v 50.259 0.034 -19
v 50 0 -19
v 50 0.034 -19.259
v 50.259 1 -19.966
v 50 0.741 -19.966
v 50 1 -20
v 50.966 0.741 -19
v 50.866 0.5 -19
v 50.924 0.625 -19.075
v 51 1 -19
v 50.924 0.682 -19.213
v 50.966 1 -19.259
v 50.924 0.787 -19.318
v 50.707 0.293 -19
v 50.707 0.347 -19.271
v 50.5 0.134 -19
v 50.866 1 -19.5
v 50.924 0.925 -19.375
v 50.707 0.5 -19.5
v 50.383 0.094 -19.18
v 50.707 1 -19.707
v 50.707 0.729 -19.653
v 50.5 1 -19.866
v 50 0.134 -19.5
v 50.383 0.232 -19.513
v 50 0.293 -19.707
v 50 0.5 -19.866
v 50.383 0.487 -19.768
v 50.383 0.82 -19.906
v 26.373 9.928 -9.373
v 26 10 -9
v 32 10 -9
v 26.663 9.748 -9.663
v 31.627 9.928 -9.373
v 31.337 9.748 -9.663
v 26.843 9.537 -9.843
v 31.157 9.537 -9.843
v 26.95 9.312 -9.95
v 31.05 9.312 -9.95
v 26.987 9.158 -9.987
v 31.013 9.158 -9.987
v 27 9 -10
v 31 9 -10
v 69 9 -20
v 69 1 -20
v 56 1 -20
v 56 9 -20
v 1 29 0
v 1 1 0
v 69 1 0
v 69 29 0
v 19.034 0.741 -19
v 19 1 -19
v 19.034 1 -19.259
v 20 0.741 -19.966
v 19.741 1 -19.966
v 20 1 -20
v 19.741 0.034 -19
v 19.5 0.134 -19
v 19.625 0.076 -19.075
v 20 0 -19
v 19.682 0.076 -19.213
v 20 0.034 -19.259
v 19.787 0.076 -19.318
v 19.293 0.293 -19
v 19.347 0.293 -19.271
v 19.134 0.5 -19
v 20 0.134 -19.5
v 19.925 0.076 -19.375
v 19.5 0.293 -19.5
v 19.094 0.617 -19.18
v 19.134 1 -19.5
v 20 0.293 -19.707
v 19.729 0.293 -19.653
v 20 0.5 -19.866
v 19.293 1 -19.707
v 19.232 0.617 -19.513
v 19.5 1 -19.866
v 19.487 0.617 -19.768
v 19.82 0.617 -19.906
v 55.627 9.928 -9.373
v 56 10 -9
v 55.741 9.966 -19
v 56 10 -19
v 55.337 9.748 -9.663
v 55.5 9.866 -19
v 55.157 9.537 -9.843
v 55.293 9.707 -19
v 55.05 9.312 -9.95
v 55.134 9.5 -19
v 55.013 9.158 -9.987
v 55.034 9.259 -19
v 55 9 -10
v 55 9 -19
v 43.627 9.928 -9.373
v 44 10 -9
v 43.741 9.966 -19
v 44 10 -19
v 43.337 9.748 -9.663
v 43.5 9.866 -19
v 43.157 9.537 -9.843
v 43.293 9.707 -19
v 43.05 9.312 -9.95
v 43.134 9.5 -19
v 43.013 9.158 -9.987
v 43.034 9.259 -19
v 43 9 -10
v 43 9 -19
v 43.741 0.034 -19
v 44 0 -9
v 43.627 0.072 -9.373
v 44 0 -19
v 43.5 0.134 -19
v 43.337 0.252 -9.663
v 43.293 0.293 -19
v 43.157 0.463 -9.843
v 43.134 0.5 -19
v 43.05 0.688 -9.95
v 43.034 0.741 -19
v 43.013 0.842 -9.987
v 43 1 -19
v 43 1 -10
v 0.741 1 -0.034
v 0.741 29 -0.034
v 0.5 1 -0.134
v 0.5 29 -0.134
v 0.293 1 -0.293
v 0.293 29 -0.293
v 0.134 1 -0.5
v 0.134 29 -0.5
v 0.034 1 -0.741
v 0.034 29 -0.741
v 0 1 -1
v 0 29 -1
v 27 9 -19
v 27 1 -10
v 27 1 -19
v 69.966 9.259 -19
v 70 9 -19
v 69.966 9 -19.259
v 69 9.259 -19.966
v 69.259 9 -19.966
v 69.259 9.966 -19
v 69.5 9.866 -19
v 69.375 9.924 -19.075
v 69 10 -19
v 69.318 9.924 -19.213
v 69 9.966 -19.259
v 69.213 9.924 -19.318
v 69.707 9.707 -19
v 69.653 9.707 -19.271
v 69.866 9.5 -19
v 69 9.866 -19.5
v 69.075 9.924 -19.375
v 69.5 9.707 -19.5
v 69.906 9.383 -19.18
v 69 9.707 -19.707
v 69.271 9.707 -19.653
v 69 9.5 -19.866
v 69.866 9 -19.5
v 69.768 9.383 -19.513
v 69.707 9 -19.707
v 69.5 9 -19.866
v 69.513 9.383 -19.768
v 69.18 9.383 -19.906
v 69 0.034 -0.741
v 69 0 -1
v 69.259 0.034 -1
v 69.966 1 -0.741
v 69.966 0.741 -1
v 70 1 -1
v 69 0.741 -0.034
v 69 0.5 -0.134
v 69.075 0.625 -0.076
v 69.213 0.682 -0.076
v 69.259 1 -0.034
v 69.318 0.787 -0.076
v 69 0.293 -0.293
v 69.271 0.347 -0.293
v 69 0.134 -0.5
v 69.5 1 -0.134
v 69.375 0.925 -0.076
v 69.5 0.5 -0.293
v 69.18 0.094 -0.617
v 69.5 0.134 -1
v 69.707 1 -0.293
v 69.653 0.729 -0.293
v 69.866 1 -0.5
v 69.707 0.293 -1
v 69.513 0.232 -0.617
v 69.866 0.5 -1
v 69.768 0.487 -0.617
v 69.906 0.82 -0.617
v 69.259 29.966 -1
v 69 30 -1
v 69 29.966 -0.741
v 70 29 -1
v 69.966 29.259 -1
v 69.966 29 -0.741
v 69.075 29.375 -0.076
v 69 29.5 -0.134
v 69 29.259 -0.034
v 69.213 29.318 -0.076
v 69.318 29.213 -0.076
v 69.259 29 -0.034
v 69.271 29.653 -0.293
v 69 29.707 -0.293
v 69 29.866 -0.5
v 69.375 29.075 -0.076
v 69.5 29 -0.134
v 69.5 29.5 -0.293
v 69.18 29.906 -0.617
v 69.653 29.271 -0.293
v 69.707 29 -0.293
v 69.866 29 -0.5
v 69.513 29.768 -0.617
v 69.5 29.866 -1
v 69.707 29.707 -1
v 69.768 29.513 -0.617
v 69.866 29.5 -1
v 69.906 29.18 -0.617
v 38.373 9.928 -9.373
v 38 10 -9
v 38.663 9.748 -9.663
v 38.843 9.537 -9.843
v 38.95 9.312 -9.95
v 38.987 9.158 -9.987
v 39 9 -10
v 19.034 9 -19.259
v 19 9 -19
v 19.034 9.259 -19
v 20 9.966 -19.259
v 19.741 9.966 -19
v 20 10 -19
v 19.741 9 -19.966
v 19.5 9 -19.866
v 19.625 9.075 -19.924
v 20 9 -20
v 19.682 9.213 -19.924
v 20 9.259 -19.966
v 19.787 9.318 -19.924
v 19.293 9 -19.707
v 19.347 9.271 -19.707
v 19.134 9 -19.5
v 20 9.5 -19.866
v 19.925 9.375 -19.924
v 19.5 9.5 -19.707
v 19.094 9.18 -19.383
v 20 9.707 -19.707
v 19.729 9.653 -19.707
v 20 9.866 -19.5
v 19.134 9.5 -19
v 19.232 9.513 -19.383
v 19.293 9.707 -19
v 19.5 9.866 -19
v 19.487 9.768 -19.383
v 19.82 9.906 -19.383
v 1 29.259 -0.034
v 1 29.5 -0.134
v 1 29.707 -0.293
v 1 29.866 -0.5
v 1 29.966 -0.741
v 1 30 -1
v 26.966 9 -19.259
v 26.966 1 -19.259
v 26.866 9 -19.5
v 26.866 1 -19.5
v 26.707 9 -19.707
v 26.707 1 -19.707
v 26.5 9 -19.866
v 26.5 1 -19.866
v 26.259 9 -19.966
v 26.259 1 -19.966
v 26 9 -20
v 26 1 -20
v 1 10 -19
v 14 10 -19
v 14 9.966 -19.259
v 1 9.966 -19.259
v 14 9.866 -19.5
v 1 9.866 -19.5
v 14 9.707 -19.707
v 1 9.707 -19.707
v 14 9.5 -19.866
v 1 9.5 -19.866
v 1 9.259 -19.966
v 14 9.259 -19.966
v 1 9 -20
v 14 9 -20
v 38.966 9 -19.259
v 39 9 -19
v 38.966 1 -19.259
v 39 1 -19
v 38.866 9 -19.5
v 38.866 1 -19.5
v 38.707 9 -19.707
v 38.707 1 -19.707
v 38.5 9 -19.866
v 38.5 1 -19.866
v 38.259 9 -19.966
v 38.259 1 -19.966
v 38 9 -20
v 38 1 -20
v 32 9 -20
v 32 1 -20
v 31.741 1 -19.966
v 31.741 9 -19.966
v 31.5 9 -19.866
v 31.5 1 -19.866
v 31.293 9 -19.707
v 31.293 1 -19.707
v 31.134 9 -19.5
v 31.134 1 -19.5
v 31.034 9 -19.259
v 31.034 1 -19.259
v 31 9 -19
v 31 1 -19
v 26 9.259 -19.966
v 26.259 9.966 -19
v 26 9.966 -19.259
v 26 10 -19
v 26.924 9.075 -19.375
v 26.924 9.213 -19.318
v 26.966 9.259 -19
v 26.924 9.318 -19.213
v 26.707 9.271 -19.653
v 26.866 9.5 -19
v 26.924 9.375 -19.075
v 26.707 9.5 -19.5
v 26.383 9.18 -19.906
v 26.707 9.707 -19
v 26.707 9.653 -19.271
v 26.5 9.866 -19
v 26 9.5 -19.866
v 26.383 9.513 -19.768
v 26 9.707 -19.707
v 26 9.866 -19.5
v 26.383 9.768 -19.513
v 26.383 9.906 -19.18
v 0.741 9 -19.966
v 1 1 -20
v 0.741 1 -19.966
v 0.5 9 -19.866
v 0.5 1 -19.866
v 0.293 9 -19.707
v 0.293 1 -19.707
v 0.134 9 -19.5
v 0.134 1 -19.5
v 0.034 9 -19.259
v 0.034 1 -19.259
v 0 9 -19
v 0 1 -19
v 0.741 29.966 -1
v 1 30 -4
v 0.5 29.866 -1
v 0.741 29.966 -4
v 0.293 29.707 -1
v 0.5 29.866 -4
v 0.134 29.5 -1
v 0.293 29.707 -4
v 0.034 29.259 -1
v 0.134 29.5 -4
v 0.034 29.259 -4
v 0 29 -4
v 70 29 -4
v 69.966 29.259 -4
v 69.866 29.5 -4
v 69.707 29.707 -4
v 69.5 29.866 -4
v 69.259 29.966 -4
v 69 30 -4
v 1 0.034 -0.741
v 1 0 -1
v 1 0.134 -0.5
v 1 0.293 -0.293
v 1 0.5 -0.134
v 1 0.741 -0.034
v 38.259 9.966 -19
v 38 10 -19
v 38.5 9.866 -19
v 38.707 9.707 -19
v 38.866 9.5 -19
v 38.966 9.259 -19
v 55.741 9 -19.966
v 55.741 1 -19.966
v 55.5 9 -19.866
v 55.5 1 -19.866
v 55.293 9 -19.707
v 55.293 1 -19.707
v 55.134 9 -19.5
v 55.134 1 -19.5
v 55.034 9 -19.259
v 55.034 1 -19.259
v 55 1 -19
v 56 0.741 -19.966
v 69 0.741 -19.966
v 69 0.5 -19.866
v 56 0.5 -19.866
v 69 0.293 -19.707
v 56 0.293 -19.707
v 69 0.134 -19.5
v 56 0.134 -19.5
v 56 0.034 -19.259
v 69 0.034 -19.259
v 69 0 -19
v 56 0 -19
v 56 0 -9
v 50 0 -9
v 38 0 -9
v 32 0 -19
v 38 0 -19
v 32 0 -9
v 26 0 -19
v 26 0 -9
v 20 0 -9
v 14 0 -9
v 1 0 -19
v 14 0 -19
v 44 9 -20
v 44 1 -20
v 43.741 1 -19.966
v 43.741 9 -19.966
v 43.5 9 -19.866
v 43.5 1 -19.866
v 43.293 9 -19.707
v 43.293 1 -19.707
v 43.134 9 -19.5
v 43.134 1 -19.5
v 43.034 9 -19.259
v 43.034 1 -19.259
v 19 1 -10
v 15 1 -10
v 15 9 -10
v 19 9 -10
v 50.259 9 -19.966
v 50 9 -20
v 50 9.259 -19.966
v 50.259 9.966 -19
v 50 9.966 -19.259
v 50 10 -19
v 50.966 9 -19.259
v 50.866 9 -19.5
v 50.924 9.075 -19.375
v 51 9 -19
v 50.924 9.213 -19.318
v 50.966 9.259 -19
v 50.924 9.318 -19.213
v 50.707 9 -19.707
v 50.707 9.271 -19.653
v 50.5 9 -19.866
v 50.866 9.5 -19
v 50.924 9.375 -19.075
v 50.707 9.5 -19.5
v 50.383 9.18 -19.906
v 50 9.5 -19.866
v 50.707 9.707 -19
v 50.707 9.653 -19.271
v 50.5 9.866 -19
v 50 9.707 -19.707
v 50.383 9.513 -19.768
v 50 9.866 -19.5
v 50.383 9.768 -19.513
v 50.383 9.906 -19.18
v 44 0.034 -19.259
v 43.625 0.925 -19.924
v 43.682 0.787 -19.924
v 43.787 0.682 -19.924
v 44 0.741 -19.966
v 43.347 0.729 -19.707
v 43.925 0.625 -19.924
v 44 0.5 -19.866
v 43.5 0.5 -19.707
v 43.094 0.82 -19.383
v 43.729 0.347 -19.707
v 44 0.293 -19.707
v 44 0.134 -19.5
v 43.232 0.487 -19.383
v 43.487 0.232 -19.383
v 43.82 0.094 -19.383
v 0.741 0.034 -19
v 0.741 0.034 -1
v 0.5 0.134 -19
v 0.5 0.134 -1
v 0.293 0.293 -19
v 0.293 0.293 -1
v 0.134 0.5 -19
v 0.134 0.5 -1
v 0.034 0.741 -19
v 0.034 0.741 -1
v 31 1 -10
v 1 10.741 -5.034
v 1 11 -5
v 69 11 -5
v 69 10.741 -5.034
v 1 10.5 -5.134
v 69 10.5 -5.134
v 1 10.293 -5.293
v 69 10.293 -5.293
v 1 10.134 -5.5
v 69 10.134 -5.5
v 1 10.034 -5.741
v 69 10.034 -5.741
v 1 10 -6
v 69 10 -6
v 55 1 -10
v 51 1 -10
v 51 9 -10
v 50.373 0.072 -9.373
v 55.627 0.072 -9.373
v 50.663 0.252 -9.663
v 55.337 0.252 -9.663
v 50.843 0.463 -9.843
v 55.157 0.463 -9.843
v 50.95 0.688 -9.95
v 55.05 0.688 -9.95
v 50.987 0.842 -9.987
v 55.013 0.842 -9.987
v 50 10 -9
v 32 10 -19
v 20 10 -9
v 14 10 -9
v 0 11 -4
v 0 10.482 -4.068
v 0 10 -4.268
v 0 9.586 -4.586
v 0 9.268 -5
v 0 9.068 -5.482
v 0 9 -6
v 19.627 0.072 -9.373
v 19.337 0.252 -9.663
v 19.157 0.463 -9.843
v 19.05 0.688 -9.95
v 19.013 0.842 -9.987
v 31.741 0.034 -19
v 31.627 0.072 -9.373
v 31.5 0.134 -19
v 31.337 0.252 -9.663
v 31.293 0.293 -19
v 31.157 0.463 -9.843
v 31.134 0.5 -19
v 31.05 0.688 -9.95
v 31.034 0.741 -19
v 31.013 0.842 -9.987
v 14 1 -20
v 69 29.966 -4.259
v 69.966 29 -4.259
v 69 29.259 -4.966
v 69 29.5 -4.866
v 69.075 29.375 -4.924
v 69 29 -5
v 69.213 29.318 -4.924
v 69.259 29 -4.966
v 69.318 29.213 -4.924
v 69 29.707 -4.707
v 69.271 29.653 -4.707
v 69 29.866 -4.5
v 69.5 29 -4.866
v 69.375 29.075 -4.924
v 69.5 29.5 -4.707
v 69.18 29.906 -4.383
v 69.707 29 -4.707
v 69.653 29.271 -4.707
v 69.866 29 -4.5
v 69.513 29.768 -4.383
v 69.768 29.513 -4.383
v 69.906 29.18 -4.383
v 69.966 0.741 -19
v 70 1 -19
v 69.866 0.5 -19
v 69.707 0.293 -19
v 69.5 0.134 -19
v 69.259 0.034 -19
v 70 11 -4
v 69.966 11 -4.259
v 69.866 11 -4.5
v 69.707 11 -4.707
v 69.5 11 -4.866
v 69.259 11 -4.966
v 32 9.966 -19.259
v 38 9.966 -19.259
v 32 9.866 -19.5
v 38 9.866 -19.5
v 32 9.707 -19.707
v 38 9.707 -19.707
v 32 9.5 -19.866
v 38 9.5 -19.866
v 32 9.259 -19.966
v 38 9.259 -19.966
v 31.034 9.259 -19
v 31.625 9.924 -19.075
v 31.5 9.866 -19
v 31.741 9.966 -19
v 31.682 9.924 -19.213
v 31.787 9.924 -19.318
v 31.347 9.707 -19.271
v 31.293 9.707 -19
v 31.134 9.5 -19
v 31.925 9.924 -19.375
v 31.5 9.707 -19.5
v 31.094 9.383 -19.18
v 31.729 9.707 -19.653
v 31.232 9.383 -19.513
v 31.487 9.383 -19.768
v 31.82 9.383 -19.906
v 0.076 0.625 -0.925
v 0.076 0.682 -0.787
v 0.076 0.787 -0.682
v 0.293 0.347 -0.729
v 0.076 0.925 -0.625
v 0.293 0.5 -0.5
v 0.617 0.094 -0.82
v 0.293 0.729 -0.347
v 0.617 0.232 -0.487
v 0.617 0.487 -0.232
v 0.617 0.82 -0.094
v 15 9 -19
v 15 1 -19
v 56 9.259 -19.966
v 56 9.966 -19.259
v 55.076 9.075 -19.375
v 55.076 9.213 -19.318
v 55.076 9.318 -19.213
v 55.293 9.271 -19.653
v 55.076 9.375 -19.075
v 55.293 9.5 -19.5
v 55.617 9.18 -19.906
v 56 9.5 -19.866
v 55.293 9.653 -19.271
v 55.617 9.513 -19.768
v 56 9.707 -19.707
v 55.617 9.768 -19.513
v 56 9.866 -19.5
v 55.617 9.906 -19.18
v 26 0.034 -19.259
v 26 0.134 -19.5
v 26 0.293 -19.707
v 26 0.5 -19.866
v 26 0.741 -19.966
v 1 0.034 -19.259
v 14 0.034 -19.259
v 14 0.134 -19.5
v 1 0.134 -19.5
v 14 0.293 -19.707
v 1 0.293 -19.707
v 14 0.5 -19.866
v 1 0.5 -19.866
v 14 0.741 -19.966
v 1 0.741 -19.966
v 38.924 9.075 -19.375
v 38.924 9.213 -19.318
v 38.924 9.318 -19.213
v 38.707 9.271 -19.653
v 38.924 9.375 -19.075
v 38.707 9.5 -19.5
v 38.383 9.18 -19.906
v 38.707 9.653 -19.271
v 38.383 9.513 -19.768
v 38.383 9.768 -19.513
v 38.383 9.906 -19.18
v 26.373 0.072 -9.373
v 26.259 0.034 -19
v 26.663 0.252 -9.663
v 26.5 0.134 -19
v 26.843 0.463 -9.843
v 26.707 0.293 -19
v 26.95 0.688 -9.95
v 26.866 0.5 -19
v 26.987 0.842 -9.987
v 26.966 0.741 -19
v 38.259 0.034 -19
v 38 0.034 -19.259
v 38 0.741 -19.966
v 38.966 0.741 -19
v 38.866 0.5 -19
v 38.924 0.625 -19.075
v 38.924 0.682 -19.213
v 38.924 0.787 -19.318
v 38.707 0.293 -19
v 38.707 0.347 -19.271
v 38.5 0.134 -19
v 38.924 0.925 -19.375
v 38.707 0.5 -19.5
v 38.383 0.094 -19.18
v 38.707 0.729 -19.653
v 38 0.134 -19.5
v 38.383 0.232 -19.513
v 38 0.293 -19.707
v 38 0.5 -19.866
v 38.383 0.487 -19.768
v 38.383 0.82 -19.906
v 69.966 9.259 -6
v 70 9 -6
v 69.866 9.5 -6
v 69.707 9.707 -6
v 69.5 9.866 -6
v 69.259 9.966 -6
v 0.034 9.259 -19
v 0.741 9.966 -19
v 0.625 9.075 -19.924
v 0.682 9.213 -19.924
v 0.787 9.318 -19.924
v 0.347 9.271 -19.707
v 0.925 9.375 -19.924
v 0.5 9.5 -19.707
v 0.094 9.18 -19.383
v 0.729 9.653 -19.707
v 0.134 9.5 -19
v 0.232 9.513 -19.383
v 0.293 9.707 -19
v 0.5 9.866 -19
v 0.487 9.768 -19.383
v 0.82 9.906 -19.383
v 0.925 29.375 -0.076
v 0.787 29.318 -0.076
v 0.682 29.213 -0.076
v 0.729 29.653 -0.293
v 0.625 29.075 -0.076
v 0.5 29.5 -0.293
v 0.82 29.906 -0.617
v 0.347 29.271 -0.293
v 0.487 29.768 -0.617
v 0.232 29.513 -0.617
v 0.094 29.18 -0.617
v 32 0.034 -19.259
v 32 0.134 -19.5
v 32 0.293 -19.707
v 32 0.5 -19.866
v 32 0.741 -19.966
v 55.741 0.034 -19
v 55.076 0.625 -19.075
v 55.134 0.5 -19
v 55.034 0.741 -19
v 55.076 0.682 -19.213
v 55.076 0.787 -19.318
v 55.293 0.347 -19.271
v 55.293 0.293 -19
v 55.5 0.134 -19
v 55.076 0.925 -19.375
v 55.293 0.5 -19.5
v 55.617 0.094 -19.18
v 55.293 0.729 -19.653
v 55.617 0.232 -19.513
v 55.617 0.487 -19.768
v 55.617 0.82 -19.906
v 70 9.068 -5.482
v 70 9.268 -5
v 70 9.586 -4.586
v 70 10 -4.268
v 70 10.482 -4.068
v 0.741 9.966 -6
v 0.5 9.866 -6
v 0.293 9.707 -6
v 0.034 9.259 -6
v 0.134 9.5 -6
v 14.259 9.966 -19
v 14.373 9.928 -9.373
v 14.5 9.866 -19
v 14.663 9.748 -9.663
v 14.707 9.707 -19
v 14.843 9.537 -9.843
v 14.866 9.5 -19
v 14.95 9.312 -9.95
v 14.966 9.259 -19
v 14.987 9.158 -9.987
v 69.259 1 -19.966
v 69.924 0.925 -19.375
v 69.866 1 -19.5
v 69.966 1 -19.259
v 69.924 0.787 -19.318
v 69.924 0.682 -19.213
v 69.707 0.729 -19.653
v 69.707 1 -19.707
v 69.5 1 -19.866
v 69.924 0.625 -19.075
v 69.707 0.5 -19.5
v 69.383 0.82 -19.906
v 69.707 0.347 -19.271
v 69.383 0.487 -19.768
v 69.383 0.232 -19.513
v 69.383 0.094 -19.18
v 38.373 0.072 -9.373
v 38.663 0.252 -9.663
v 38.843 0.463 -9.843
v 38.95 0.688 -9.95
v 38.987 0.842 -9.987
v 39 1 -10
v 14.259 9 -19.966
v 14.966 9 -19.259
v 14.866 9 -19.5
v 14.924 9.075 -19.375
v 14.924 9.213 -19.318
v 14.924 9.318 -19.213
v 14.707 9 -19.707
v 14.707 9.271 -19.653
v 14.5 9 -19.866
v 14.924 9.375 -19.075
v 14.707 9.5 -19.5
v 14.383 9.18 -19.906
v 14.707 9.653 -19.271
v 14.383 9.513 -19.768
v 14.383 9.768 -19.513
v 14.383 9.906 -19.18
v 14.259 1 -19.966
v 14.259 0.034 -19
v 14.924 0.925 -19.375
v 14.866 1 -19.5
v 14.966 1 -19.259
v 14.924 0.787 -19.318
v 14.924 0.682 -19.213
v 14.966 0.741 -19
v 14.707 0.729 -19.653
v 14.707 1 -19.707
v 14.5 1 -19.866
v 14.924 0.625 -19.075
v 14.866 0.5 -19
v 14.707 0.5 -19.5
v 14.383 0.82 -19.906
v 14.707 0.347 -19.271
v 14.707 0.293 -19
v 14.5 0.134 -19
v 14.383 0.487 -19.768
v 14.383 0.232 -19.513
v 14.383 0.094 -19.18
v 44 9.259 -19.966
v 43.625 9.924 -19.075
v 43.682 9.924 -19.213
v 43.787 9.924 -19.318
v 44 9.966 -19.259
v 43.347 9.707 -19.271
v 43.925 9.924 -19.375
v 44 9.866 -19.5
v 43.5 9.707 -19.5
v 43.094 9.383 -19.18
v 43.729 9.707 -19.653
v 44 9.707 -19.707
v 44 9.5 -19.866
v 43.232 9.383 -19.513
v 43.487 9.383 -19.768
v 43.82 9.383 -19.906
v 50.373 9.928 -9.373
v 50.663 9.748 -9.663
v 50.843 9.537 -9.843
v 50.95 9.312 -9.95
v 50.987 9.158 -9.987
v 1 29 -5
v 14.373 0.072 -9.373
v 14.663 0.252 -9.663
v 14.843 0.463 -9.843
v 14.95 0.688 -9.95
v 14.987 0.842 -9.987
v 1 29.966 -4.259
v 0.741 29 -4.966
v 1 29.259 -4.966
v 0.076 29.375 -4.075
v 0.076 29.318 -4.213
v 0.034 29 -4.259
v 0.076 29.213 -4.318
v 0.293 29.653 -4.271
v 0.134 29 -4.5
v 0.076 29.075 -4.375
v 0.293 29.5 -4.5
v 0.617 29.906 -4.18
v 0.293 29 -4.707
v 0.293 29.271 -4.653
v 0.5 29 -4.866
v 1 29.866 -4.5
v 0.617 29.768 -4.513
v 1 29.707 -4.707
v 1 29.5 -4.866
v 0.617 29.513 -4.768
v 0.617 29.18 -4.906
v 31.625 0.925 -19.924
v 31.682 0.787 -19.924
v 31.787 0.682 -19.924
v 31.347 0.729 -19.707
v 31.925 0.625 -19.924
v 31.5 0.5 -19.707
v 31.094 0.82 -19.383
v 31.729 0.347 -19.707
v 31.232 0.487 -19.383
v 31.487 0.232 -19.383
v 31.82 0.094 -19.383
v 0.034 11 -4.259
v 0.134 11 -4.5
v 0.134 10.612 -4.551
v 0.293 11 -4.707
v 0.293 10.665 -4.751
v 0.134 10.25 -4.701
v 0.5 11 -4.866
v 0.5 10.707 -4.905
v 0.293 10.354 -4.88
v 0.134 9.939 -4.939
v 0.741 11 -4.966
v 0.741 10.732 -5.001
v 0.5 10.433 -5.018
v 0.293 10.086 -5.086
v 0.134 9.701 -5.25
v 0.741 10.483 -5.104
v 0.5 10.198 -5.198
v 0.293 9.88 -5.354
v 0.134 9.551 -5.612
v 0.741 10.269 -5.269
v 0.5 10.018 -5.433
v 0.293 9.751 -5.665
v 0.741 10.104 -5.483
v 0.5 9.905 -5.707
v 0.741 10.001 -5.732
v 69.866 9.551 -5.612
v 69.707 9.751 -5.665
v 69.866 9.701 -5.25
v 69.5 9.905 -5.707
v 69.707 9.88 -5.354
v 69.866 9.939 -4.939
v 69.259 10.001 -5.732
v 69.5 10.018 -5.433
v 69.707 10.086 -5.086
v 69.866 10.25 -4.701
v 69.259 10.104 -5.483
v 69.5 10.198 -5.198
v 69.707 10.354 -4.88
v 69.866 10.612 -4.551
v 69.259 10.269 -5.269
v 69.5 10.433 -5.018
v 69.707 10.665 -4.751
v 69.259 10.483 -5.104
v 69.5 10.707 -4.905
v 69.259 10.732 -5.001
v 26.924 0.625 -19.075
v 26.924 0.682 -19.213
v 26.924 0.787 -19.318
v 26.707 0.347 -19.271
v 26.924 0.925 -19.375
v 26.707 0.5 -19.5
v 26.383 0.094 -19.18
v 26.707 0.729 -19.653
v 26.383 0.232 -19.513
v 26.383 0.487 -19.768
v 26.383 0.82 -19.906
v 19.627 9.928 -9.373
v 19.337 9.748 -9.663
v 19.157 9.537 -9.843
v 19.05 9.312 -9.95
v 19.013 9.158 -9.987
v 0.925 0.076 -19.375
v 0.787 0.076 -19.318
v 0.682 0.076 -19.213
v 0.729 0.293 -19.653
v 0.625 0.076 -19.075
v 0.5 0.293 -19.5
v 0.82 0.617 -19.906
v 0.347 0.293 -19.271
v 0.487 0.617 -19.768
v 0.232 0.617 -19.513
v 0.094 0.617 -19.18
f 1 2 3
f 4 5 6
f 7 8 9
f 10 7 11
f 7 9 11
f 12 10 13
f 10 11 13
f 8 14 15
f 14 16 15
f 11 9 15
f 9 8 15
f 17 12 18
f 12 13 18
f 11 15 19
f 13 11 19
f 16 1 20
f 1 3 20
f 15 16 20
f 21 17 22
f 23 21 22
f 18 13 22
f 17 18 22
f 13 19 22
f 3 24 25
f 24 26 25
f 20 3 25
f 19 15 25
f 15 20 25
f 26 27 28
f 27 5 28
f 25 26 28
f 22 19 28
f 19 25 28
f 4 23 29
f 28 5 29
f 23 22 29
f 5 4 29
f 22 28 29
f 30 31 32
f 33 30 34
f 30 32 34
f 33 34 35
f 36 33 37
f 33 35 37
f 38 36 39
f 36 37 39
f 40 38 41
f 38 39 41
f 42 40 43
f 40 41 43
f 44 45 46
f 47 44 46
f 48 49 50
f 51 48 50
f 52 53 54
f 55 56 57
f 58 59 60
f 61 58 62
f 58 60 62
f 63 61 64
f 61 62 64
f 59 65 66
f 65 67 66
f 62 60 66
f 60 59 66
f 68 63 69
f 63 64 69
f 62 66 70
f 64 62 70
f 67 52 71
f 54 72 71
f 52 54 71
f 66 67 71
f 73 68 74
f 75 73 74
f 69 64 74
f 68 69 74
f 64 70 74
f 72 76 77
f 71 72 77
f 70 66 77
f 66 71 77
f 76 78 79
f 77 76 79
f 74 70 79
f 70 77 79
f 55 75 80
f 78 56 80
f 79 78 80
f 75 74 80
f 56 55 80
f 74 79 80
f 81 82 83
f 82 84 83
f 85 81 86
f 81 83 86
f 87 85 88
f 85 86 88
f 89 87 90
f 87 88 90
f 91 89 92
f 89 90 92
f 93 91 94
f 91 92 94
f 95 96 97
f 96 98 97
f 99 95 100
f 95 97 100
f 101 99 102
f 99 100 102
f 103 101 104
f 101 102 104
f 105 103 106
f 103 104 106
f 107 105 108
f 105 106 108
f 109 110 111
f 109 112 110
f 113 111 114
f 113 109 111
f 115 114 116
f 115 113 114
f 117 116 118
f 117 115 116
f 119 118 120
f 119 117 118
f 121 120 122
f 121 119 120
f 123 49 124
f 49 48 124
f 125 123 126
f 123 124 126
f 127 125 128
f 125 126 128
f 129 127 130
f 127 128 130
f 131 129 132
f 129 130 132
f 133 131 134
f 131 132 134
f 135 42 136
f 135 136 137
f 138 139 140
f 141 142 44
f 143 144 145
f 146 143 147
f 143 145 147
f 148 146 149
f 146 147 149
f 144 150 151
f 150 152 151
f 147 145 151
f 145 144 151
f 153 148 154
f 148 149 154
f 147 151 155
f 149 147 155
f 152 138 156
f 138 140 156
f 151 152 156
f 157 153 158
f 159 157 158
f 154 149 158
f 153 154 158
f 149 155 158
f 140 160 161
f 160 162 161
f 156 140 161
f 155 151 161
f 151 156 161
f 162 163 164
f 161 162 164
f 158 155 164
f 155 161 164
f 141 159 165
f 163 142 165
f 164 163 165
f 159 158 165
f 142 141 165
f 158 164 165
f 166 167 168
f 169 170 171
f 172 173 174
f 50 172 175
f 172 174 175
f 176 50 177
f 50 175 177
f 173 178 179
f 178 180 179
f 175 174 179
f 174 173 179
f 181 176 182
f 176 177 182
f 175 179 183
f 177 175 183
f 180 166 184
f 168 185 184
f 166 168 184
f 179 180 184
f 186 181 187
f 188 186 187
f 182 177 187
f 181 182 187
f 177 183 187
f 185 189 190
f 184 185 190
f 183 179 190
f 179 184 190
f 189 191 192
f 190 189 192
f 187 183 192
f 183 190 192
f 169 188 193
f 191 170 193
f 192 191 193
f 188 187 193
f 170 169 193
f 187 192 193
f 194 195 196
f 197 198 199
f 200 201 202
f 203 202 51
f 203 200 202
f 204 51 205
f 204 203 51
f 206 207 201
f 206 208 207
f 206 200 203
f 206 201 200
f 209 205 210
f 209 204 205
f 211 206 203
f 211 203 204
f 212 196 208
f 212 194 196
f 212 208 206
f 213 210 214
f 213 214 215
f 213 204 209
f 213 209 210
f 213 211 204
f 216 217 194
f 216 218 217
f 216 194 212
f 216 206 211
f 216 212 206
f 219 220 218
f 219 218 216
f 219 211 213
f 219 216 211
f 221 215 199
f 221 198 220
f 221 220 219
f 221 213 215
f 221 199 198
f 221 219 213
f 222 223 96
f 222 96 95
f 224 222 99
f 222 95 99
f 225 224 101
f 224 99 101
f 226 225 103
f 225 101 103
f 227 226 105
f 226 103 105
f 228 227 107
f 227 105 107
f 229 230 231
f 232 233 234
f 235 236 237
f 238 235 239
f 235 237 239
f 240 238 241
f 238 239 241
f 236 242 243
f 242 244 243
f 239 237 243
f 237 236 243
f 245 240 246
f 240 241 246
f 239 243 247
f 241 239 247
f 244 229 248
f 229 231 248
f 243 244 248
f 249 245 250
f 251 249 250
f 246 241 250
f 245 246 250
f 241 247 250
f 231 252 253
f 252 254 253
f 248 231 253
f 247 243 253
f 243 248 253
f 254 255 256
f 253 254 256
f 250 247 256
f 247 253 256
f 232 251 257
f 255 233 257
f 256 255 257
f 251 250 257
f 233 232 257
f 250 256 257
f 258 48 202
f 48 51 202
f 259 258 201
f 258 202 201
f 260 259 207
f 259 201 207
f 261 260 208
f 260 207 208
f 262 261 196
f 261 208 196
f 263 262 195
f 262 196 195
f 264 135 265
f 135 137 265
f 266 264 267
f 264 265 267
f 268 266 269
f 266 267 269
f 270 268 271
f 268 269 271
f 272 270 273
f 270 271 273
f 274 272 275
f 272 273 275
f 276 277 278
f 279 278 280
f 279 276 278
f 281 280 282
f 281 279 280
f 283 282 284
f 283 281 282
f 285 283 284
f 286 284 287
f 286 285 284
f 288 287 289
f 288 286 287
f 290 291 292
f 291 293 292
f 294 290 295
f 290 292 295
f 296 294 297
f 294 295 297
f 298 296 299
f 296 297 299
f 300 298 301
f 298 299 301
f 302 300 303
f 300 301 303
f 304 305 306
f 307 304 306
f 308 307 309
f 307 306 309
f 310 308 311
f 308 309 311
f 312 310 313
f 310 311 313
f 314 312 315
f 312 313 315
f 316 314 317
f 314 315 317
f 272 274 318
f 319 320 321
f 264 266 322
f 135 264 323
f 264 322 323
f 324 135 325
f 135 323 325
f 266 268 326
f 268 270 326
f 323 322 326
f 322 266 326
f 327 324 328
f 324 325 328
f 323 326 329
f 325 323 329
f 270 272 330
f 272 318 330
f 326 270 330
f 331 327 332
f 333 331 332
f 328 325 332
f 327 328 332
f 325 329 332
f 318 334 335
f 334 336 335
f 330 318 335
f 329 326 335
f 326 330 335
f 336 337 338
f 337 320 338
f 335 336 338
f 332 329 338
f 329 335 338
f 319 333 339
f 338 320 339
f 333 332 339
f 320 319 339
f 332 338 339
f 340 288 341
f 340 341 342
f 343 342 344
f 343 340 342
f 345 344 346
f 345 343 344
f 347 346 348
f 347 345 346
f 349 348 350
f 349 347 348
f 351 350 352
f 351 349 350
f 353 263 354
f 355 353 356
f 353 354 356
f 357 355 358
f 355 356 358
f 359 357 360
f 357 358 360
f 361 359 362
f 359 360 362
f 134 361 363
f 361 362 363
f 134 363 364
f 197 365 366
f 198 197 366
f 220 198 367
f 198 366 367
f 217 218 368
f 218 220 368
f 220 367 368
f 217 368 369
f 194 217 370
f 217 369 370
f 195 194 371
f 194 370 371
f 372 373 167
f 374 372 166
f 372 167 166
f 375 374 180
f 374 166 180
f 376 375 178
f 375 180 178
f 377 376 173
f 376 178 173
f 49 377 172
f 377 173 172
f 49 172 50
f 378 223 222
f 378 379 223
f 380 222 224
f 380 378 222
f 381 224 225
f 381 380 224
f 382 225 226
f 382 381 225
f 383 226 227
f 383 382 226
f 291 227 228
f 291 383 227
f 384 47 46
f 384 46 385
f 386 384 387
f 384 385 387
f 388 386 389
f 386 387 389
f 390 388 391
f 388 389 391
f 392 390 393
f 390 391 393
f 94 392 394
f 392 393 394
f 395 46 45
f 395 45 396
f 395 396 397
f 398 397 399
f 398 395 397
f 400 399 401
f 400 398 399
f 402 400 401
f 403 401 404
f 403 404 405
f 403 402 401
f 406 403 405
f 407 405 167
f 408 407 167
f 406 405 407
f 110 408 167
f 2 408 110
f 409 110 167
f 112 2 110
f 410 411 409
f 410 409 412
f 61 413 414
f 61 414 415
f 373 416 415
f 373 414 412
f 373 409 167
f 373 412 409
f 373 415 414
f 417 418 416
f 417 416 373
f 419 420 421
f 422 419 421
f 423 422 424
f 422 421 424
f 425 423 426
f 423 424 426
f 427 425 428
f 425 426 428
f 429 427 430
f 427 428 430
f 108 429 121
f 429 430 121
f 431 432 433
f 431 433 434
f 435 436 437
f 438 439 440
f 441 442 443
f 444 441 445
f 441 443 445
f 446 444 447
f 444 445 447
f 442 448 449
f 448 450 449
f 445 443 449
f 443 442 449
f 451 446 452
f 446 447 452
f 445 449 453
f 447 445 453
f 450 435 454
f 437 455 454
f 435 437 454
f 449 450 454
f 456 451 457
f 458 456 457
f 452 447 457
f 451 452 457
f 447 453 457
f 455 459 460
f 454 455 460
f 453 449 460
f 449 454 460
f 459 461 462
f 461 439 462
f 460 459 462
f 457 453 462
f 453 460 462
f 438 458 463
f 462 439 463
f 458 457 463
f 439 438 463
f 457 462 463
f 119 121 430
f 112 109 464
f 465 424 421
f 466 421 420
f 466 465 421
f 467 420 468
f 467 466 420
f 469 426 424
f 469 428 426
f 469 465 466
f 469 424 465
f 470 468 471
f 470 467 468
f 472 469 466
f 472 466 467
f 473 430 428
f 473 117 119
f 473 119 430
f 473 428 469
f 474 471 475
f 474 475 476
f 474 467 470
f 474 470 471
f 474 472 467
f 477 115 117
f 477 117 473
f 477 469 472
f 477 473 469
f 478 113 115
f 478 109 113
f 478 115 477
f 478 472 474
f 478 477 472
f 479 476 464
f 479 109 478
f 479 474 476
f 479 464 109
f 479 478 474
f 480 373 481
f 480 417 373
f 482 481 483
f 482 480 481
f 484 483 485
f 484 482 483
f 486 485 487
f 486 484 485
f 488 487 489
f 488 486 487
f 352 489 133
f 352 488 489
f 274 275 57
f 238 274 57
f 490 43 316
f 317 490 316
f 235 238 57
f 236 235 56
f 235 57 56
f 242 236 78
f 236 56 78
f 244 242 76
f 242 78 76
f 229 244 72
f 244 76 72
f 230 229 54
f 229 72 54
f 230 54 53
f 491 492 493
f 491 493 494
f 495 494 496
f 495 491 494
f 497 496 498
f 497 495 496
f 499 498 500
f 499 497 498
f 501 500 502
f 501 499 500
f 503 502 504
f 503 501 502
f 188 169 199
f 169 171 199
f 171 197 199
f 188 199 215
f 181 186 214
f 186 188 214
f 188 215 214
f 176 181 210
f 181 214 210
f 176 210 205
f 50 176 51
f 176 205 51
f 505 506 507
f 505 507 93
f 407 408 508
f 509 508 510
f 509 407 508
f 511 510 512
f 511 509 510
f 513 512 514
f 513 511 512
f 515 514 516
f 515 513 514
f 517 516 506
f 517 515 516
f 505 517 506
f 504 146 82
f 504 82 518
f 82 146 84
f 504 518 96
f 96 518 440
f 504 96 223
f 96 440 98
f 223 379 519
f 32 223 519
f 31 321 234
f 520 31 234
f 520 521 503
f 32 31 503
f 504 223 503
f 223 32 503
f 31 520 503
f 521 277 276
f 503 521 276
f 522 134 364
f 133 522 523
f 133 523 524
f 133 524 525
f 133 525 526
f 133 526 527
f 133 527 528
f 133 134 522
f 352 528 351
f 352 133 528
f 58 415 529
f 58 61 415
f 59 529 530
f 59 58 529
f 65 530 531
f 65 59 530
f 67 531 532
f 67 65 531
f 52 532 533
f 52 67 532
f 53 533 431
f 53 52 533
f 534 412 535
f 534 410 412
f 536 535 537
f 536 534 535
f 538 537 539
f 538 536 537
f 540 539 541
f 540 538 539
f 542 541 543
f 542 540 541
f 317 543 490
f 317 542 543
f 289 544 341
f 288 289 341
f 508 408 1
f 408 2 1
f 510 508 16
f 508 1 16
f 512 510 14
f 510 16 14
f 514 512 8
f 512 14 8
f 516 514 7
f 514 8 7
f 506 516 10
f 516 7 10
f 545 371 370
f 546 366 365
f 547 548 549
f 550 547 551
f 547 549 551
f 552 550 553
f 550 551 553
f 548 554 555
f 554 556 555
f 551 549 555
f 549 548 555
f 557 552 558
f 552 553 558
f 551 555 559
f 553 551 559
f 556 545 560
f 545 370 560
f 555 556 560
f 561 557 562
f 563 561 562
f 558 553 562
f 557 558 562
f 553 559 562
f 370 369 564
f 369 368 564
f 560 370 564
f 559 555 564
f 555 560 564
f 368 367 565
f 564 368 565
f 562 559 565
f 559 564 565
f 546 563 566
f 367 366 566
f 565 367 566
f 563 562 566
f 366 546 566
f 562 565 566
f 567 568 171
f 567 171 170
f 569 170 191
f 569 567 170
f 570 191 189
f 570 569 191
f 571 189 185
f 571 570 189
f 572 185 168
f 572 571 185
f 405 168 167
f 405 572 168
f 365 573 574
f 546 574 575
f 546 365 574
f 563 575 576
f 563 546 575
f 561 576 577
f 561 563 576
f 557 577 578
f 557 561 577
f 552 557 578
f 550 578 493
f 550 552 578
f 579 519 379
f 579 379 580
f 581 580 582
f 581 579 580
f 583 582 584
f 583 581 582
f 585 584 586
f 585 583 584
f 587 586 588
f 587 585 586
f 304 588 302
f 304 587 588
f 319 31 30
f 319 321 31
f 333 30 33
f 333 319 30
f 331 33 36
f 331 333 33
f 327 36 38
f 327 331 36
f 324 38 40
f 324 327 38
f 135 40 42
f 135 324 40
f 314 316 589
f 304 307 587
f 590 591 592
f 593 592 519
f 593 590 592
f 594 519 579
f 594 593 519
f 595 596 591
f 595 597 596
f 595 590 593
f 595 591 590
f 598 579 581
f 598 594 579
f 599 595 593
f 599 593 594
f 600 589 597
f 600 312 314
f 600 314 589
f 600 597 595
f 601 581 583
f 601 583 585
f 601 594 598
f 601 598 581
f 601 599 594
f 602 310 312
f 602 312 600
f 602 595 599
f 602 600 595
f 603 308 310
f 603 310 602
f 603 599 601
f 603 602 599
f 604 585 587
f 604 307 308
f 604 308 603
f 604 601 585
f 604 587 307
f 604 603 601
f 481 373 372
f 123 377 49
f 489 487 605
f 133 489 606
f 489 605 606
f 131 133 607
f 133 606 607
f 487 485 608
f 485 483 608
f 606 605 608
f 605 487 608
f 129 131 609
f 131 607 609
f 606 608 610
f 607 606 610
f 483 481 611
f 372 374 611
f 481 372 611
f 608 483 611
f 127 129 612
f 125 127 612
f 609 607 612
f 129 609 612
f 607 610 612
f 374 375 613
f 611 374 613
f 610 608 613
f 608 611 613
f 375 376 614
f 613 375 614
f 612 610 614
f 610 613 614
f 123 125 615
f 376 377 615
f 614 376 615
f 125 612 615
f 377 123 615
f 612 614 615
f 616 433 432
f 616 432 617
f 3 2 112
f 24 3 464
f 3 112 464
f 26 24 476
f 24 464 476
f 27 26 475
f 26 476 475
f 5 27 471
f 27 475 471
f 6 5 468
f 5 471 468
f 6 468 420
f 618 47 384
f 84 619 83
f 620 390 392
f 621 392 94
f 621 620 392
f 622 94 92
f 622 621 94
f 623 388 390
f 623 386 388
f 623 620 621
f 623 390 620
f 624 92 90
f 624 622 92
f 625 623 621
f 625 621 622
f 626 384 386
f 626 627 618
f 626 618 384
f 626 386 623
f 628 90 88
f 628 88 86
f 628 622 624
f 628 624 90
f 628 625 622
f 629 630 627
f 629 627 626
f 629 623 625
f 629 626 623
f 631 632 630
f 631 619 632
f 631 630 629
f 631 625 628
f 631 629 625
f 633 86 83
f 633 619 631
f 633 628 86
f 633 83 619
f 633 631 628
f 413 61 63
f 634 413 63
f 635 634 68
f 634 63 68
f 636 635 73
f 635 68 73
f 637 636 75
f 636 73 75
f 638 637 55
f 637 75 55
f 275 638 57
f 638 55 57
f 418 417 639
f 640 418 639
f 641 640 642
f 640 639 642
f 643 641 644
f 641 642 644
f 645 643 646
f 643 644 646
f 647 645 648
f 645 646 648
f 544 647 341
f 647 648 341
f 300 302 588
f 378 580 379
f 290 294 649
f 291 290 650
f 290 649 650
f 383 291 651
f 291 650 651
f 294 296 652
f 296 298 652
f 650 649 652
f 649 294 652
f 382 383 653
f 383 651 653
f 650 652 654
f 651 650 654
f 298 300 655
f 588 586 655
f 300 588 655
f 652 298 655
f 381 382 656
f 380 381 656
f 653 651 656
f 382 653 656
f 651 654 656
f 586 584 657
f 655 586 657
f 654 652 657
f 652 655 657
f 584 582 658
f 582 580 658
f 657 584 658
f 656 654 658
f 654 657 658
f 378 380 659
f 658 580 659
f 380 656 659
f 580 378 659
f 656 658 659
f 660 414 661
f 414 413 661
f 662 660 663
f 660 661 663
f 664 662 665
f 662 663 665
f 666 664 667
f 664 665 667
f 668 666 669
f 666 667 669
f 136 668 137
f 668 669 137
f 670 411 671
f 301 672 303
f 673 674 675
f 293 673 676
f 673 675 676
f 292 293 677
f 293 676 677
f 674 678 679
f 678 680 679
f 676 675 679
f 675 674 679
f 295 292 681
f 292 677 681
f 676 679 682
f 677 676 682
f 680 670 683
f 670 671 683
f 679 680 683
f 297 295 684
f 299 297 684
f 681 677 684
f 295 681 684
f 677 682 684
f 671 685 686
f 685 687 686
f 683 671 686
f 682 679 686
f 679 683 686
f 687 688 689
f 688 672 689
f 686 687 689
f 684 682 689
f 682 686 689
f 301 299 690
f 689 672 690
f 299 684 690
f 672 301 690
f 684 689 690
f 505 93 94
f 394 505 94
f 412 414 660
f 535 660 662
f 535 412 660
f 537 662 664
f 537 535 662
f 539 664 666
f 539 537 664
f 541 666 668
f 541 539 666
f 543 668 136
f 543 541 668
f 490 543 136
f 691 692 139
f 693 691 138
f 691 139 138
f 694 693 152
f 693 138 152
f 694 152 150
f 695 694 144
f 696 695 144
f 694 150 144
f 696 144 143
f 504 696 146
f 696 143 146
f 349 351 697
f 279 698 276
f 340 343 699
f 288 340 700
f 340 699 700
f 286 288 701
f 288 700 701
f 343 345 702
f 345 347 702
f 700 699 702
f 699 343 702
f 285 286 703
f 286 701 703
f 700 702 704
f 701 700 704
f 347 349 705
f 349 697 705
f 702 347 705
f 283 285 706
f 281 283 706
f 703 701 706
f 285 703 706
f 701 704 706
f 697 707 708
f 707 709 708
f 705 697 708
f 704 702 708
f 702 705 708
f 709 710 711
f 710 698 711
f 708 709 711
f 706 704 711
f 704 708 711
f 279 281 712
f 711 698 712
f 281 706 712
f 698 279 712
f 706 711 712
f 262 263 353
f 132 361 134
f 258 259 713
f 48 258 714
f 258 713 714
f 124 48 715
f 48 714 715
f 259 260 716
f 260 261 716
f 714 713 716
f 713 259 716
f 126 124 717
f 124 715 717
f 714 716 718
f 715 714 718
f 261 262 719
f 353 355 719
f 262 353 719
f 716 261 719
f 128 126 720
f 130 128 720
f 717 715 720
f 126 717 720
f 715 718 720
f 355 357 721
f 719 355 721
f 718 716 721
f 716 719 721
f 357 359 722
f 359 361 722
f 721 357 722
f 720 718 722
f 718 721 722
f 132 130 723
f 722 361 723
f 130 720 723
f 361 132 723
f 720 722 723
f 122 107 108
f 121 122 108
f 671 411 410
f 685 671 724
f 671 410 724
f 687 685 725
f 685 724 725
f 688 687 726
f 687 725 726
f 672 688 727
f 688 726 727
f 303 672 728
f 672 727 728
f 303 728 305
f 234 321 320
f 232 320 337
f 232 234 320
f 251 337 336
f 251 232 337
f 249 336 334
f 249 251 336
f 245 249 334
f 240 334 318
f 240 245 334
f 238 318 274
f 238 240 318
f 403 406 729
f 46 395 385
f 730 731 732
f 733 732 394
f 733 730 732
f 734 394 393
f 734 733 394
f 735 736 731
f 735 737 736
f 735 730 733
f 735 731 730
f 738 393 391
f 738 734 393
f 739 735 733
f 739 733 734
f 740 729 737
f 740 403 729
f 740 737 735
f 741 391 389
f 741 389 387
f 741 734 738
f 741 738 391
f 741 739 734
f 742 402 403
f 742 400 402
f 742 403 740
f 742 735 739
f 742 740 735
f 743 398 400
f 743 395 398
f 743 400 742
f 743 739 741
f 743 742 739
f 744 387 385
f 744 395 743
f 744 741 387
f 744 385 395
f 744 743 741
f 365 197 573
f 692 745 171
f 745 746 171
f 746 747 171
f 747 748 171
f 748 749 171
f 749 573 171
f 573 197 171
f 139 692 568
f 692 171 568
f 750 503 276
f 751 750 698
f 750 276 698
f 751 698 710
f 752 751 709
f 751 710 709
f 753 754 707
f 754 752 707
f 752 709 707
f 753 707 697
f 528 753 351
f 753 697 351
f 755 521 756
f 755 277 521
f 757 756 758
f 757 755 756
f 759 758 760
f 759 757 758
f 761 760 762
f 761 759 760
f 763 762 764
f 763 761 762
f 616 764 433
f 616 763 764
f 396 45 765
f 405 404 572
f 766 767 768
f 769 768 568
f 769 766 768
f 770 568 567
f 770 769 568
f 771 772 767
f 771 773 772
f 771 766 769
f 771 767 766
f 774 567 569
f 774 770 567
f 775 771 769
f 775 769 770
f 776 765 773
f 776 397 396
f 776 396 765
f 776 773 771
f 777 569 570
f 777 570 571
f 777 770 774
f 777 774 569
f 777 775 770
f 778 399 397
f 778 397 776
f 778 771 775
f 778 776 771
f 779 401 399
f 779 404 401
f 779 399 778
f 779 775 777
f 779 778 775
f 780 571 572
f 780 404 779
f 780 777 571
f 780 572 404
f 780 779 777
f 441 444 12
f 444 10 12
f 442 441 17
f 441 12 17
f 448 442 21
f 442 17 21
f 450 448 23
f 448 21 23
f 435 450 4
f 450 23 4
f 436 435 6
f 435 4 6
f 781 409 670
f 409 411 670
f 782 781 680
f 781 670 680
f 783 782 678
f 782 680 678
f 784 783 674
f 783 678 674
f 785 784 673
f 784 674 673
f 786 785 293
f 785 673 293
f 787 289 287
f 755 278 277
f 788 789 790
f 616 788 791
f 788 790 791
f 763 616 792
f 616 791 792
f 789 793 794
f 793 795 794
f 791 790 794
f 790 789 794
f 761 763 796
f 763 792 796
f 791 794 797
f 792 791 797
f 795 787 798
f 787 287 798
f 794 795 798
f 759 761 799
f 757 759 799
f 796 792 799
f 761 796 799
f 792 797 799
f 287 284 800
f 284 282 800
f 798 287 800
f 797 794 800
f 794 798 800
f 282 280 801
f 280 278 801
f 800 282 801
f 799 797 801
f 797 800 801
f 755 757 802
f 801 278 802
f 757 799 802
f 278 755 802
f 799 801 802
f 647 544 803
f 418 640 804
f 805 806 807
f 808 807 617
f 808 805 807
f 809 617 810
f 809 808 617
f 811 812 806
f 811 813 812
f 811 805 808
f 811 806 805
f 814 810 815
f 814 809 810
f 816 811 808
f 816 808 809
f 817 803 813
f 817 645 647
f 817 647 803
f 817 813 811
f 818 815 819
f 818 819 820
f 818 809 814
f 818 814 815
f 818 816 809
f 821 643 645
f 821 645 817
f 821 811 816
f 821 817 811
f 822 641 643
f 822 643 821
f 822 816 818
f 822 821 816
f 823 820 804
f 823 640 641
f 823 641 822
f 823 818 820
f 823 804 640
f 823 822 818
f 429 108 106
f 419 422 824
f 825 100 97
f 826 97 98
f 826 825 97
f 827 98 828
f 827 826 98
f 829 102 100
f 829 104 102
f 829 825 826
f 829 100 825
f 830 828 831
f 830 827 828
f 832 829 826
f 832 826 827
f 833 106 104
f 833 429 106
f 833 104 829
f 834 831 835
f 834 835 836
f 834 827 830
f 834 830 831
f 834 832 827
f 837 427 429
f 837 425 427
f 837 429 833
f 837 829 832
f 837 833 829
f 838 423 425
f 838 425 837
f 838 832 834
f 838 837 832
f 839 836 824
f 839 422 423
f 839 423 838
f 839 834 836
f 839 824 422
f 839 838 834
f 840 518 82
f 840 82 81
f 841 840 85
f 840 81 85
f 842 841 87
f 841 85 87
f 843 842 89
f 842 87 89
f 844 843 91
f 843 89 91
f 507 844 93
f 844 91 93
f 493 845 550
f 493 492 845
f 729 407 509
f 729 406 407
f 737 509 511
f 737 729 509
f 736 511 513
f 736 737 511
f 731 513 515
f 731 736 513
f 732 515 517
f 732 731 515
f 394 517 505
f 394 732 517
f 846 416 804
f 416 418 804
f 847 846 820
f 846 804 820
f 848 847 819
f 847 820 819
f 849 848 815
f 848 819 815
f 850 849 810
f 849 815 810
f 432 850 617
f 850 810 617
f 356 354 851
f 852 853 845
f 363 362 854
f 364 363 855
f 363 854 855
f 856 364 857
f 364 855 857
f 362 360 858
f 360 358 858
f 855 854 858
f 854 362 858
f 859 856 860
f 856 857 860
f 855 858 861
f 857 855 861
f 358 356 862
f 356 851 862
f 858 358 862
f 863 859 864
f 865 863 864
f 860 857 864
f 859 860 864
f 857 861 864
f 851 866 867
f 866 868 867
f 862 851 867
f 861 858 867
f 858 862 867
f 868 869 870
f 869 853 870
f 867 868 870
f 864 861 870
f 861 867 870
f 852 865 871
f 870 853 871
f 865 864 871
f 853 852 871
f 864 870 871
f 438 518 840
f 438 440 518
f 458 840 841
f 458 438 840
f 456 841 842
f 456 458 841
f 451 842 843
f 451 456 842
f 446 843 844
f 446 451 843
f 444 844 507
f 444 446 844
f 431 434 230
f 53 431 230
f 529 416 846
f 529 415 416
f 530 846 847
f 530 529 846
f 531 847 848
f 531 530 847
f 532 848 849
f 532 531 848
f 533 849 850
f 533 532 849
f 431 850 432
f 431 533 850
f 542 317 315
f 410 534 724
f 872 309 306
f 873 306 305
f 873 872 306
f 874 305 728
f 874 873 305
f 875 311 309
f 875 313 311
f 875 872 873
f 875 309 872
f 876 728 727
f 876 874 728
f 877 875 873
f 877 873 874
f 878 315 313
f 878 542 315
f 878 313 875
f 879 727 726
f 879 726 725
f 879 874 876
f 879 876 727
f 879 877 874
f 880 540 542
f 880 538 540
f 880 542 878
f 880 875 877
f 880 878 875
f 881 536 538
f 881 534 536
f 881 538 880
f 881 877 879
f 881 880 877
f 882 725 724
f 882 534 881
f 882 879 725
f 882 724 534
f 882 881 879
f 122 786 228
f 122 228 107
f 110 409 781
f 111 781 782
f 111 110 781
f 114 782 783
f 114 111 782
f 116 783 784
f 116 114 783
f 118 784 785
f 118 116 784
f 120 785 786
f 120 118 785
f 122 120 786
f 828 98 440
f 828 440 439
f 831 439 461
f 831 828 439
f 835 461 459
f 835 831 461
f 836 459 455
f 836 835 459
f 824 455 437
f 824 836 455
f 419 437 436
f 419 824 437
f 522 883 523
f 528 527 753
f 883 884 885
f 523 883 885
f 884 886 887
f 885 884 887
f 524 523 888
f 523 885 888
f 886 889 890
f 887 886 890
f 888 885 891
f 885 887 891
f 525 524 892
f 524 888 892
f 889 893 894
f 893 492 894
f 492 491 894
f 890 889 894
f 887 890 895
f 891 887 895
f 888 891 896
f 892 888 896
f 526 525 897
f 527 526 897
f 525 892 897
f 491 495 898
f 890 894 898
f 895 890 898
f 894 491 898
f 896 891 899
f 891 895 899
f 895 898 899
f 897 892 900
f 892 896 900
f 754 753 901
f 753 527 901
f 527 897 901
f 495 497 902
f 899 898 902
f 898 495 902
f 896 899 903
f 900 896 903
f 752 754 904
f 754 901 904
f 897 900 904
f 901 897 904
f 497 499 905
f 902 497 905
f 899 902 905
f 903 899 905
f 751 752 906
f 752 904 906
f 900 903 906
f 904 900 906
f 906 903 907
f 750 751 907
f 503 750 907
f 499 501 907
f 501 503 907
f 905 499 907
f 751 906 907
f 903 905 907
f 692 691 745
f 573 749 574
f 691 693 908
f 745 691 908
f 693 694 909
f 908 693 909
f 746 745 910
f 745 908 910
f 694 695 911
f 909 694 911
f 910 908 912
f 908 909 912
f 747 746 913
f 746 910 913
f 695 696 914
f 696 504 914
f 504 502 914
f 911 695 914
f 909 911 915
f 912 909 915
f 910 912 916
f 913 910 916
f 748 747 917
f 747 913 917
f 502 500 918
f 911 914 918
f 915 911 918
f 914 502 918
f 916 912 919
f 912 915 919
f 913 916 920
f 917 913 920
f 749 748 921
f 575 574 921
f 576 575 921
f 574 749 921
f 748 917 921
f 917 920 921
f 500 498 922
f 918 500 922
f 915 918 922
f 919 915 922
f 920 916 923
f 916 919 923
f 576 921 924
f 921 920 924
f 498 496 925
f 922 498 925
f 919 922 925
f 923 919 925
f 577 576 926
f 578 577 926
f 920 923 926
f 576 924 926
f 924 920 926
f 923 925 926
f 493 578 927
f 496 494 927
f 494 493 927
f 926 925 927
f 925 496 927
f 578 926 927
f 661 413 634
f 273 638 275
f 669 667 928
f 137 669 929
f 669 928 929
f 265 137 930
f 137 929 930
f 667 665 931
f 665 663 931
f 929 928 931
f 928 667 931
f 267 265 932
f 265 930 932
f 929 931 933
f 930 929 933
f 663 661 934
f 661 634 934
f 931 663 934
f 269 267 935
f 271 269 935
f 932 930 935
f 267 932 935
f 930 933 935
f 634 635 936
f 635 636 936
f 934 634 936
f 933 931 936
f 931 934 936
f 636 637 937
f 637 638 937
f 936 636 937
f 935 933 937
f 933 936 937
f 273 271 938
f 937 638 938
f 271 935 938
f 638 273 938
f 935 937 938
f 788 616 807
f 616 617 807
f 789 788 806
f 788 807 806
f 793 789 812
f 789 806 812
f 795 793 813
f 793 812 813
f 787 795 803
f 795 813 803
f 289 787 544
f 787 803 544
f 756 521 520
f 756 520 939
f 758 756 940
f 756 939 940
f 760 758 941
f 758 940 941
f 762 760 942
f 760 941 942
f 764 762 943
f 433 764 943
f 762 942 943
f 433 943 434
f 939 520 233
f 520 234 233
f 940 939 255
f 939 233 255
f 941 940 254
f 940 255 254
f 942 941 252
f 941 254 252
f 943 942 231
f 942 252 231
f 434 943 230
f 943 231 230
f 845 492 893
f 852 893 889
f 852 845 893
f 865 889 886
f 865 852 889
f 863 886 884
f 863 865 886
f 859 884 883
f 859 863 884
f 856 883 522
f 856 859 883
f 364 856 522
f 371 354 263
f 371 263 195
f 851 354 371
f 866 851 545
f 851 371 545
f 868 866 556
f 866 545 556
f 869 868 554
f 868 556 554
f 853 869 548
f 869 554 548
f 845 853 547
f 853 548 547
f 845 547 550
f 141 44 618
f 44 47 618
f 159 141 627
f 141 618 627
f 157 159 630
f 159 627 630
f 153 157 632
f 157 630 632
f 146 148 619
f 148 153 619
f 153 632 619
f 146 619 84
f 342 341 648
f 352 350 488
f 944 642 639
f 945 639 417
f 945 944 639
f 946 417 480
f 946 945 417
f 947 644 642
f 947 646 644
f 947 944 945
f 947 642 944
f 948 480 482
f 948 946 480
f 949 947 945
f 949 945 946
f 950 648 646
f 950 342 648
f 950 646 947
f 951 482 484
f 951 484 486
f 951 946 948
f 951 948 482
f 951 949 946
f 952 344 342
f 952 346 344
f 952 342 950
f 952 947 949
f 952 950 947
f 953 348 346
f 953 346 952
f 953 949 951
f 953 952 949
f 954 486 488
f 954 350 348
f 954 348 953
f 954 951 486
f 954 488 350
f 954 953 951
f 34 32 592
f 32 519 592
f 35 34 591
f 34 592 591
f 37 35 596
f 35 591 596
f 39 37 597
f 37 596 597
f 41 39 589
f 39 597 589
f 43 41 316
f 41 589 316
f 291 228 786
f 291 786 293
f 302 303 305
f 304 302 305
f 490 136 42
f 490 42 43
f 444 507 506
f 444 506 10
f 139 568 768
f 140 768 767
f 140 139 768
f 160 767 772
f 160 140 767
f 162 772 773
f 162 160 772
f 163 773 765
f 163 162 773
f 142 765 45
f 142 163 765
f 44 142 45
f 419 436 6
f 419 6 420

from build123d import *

# Parameters (mm, degrees)
SKETCH1_W           = 70
SKETCH1_H           = 5
BOSS_EXTRUDE1_DEPTH = 30
SKETCH4_W           = 70
SKETCH4_H           = 15
BOSS_EXTRUDE2_DEPTH = 10
SKETCH5_W           = 4
SKETCH5_H           = 10
CUT_EXTRUDE1_DEPTH  = 10
SKETCH6_W           = 4
SKETCH6_H           = 10
CUT_EXTRUDE2_DEPTH  = 10
SKETCH7_W           = 4
SKETCH7_H           = 10
CUT_EXTRUDE3_DEPTH  = 10
SKETCH8_W           = 4
SKETCH8_H           = 10
CUT_EXTRUDE4_DEPTH  = 10
FILLET5_R           = 1


with BuildPart() as part:
    # Sketch1 → Boss-Extrude1 (new body)
    with BuildSketch(Plane(origin=(0, 0, 0), x_dir=(1, 0, 0), z_dir=(0, 1, 0))):
        with Locations((35, 2.5)):
            Rectangle(SKETCH1_W, SKETCH1_H)
    extrude(amount=BOSS_EXTRUDE1_DEPTH)

    # Sketch4 → Boss-Extrude2 (add)
    with BuildSketch(Plane(origin=(0, 0, 0), x_dir=(-1, 0, 0), z_dir=(0, -1, 0))):
        with Locations((-35, 12.5)):
            Rectangle(SKETCH4_W, SKETCH4_H)
    extrude(amount=-BOSS_EXTRUDE2_DEPTH)

    # Sketch5 → Cut-Extrude1 (cut)
    with BuildSketch(Plane(origin=(0, 10, 0), x_dir=(1, 0, 0), z_dir=(0, 1, 0))):
        with Locations((17, 15)):
            Rectangle(SKETCH5_W, SKETCH5_H)
    extrude(amount=-CUT_EXTRUDE1_DEPTH, mode=Mode.SUBTRACT)

    # Sketch6 → Cut-Extrude2 (cut)
    with BuildSketch(Plane(origin=(0, 10, 0), x_dir=(1, 0, 0), z_dir=(0, 1, 0))):
        with Locations((29, 15)):
            Rectangle(SKETCH6_W, SKETCH6_H)
    extrude(amount=-CUT_EXTRUDE2_DEPTH, mode=Mode.SUBTRACT)

    # Sketch7 → Cut-Extrude3 (cut)
    with BuildSketch(Plane(origin=(0, 10, 0), x_dir=(1, 0, 0), z_dir=(0, 1, 0))):
        with Locations((41, 15)):
            Rectangle(SKETCH7_W, SKETCH7_H)
    extrude(amount=-CUT_EXTRUDE3_DEPTH, mode=Mode.SUBTRACT)

    # Sketch8 → Cut-Extrude4 (cut)
    with BuildSketch(Plane(origin=(0, 10, 0), x_dir=(1, 0, 0), z_dir=(0, 1, 0))):
        with Locations((53, 15)):
            Rectangle(SKETCH8_W, SKETCH8_H)
    extrude(amount=-CUT_EXTRUDE4_DEPTH, mode=Mode.SUBTRACT)

    # Fillet5
    fillet5_edges = [part.edges().sort_by_distance(p)[0] for p in [
        (70, 30, -2.5),
        (35, 30, -5),
        (62.5, 0, -20),
        (70, 5, -20),
        (0, 10, -12.5),
        (0, 5, -20),
        (35, 10, -5),
        (70, 10, -12.5),
        (62.5, 10, -20),
        (7.5, 10, -20),
        (7.5, 0, -20),
        (15, 5, -20),
        (19, 10, -15),
        (19, 5, -20),
        (17, 0, -10),
        (15, 0, -15),
        (19, 0, -15),
        (15, 10, -15),
        (17, 10, -10),
        (0, 30, -2.5),
        (23, 10, -20),
        (23, 0, -20),
        (27, 0, -15),
        (27, 5, -20),
        (31, 0, -15),
        (31, 5, -20),
        (29, 0, -10),
        (27, 10, -15),
        (29, 10, -10),
        (31, 10, -15),
        (70, 0, -10),
        (35, 0, 0),
        (0, 0, -10),
        (35, 10, -20),
        (35, 0, -20),
        (39, 0, -15),
        (39, 5, -20),
        (43, 0, -15),
        (43, 5, -20),
        (41, 0, -10),
        (39, 10, -15),
        (41, 10, -10),
        (43, 10, -15),
        (35, 30, 0),
        (47, 10, -20),
        (0, 20, -5),
        (47, 0, -20),
        (70, 20, -5),
        (70, 15, 0),
        (0, 15, 0),
        (51, 0, -15),
        (51, 5, -20),
        (55, 0, -15),
        (55, 5, -20),
        (53, 0, -10),
        (51, 10, -15),
        (53, 10, -10),
        (55, 10, -15),
    ]]
    fillet(fillet5_edges, radius=FILLET5_R)


solid = part.part
